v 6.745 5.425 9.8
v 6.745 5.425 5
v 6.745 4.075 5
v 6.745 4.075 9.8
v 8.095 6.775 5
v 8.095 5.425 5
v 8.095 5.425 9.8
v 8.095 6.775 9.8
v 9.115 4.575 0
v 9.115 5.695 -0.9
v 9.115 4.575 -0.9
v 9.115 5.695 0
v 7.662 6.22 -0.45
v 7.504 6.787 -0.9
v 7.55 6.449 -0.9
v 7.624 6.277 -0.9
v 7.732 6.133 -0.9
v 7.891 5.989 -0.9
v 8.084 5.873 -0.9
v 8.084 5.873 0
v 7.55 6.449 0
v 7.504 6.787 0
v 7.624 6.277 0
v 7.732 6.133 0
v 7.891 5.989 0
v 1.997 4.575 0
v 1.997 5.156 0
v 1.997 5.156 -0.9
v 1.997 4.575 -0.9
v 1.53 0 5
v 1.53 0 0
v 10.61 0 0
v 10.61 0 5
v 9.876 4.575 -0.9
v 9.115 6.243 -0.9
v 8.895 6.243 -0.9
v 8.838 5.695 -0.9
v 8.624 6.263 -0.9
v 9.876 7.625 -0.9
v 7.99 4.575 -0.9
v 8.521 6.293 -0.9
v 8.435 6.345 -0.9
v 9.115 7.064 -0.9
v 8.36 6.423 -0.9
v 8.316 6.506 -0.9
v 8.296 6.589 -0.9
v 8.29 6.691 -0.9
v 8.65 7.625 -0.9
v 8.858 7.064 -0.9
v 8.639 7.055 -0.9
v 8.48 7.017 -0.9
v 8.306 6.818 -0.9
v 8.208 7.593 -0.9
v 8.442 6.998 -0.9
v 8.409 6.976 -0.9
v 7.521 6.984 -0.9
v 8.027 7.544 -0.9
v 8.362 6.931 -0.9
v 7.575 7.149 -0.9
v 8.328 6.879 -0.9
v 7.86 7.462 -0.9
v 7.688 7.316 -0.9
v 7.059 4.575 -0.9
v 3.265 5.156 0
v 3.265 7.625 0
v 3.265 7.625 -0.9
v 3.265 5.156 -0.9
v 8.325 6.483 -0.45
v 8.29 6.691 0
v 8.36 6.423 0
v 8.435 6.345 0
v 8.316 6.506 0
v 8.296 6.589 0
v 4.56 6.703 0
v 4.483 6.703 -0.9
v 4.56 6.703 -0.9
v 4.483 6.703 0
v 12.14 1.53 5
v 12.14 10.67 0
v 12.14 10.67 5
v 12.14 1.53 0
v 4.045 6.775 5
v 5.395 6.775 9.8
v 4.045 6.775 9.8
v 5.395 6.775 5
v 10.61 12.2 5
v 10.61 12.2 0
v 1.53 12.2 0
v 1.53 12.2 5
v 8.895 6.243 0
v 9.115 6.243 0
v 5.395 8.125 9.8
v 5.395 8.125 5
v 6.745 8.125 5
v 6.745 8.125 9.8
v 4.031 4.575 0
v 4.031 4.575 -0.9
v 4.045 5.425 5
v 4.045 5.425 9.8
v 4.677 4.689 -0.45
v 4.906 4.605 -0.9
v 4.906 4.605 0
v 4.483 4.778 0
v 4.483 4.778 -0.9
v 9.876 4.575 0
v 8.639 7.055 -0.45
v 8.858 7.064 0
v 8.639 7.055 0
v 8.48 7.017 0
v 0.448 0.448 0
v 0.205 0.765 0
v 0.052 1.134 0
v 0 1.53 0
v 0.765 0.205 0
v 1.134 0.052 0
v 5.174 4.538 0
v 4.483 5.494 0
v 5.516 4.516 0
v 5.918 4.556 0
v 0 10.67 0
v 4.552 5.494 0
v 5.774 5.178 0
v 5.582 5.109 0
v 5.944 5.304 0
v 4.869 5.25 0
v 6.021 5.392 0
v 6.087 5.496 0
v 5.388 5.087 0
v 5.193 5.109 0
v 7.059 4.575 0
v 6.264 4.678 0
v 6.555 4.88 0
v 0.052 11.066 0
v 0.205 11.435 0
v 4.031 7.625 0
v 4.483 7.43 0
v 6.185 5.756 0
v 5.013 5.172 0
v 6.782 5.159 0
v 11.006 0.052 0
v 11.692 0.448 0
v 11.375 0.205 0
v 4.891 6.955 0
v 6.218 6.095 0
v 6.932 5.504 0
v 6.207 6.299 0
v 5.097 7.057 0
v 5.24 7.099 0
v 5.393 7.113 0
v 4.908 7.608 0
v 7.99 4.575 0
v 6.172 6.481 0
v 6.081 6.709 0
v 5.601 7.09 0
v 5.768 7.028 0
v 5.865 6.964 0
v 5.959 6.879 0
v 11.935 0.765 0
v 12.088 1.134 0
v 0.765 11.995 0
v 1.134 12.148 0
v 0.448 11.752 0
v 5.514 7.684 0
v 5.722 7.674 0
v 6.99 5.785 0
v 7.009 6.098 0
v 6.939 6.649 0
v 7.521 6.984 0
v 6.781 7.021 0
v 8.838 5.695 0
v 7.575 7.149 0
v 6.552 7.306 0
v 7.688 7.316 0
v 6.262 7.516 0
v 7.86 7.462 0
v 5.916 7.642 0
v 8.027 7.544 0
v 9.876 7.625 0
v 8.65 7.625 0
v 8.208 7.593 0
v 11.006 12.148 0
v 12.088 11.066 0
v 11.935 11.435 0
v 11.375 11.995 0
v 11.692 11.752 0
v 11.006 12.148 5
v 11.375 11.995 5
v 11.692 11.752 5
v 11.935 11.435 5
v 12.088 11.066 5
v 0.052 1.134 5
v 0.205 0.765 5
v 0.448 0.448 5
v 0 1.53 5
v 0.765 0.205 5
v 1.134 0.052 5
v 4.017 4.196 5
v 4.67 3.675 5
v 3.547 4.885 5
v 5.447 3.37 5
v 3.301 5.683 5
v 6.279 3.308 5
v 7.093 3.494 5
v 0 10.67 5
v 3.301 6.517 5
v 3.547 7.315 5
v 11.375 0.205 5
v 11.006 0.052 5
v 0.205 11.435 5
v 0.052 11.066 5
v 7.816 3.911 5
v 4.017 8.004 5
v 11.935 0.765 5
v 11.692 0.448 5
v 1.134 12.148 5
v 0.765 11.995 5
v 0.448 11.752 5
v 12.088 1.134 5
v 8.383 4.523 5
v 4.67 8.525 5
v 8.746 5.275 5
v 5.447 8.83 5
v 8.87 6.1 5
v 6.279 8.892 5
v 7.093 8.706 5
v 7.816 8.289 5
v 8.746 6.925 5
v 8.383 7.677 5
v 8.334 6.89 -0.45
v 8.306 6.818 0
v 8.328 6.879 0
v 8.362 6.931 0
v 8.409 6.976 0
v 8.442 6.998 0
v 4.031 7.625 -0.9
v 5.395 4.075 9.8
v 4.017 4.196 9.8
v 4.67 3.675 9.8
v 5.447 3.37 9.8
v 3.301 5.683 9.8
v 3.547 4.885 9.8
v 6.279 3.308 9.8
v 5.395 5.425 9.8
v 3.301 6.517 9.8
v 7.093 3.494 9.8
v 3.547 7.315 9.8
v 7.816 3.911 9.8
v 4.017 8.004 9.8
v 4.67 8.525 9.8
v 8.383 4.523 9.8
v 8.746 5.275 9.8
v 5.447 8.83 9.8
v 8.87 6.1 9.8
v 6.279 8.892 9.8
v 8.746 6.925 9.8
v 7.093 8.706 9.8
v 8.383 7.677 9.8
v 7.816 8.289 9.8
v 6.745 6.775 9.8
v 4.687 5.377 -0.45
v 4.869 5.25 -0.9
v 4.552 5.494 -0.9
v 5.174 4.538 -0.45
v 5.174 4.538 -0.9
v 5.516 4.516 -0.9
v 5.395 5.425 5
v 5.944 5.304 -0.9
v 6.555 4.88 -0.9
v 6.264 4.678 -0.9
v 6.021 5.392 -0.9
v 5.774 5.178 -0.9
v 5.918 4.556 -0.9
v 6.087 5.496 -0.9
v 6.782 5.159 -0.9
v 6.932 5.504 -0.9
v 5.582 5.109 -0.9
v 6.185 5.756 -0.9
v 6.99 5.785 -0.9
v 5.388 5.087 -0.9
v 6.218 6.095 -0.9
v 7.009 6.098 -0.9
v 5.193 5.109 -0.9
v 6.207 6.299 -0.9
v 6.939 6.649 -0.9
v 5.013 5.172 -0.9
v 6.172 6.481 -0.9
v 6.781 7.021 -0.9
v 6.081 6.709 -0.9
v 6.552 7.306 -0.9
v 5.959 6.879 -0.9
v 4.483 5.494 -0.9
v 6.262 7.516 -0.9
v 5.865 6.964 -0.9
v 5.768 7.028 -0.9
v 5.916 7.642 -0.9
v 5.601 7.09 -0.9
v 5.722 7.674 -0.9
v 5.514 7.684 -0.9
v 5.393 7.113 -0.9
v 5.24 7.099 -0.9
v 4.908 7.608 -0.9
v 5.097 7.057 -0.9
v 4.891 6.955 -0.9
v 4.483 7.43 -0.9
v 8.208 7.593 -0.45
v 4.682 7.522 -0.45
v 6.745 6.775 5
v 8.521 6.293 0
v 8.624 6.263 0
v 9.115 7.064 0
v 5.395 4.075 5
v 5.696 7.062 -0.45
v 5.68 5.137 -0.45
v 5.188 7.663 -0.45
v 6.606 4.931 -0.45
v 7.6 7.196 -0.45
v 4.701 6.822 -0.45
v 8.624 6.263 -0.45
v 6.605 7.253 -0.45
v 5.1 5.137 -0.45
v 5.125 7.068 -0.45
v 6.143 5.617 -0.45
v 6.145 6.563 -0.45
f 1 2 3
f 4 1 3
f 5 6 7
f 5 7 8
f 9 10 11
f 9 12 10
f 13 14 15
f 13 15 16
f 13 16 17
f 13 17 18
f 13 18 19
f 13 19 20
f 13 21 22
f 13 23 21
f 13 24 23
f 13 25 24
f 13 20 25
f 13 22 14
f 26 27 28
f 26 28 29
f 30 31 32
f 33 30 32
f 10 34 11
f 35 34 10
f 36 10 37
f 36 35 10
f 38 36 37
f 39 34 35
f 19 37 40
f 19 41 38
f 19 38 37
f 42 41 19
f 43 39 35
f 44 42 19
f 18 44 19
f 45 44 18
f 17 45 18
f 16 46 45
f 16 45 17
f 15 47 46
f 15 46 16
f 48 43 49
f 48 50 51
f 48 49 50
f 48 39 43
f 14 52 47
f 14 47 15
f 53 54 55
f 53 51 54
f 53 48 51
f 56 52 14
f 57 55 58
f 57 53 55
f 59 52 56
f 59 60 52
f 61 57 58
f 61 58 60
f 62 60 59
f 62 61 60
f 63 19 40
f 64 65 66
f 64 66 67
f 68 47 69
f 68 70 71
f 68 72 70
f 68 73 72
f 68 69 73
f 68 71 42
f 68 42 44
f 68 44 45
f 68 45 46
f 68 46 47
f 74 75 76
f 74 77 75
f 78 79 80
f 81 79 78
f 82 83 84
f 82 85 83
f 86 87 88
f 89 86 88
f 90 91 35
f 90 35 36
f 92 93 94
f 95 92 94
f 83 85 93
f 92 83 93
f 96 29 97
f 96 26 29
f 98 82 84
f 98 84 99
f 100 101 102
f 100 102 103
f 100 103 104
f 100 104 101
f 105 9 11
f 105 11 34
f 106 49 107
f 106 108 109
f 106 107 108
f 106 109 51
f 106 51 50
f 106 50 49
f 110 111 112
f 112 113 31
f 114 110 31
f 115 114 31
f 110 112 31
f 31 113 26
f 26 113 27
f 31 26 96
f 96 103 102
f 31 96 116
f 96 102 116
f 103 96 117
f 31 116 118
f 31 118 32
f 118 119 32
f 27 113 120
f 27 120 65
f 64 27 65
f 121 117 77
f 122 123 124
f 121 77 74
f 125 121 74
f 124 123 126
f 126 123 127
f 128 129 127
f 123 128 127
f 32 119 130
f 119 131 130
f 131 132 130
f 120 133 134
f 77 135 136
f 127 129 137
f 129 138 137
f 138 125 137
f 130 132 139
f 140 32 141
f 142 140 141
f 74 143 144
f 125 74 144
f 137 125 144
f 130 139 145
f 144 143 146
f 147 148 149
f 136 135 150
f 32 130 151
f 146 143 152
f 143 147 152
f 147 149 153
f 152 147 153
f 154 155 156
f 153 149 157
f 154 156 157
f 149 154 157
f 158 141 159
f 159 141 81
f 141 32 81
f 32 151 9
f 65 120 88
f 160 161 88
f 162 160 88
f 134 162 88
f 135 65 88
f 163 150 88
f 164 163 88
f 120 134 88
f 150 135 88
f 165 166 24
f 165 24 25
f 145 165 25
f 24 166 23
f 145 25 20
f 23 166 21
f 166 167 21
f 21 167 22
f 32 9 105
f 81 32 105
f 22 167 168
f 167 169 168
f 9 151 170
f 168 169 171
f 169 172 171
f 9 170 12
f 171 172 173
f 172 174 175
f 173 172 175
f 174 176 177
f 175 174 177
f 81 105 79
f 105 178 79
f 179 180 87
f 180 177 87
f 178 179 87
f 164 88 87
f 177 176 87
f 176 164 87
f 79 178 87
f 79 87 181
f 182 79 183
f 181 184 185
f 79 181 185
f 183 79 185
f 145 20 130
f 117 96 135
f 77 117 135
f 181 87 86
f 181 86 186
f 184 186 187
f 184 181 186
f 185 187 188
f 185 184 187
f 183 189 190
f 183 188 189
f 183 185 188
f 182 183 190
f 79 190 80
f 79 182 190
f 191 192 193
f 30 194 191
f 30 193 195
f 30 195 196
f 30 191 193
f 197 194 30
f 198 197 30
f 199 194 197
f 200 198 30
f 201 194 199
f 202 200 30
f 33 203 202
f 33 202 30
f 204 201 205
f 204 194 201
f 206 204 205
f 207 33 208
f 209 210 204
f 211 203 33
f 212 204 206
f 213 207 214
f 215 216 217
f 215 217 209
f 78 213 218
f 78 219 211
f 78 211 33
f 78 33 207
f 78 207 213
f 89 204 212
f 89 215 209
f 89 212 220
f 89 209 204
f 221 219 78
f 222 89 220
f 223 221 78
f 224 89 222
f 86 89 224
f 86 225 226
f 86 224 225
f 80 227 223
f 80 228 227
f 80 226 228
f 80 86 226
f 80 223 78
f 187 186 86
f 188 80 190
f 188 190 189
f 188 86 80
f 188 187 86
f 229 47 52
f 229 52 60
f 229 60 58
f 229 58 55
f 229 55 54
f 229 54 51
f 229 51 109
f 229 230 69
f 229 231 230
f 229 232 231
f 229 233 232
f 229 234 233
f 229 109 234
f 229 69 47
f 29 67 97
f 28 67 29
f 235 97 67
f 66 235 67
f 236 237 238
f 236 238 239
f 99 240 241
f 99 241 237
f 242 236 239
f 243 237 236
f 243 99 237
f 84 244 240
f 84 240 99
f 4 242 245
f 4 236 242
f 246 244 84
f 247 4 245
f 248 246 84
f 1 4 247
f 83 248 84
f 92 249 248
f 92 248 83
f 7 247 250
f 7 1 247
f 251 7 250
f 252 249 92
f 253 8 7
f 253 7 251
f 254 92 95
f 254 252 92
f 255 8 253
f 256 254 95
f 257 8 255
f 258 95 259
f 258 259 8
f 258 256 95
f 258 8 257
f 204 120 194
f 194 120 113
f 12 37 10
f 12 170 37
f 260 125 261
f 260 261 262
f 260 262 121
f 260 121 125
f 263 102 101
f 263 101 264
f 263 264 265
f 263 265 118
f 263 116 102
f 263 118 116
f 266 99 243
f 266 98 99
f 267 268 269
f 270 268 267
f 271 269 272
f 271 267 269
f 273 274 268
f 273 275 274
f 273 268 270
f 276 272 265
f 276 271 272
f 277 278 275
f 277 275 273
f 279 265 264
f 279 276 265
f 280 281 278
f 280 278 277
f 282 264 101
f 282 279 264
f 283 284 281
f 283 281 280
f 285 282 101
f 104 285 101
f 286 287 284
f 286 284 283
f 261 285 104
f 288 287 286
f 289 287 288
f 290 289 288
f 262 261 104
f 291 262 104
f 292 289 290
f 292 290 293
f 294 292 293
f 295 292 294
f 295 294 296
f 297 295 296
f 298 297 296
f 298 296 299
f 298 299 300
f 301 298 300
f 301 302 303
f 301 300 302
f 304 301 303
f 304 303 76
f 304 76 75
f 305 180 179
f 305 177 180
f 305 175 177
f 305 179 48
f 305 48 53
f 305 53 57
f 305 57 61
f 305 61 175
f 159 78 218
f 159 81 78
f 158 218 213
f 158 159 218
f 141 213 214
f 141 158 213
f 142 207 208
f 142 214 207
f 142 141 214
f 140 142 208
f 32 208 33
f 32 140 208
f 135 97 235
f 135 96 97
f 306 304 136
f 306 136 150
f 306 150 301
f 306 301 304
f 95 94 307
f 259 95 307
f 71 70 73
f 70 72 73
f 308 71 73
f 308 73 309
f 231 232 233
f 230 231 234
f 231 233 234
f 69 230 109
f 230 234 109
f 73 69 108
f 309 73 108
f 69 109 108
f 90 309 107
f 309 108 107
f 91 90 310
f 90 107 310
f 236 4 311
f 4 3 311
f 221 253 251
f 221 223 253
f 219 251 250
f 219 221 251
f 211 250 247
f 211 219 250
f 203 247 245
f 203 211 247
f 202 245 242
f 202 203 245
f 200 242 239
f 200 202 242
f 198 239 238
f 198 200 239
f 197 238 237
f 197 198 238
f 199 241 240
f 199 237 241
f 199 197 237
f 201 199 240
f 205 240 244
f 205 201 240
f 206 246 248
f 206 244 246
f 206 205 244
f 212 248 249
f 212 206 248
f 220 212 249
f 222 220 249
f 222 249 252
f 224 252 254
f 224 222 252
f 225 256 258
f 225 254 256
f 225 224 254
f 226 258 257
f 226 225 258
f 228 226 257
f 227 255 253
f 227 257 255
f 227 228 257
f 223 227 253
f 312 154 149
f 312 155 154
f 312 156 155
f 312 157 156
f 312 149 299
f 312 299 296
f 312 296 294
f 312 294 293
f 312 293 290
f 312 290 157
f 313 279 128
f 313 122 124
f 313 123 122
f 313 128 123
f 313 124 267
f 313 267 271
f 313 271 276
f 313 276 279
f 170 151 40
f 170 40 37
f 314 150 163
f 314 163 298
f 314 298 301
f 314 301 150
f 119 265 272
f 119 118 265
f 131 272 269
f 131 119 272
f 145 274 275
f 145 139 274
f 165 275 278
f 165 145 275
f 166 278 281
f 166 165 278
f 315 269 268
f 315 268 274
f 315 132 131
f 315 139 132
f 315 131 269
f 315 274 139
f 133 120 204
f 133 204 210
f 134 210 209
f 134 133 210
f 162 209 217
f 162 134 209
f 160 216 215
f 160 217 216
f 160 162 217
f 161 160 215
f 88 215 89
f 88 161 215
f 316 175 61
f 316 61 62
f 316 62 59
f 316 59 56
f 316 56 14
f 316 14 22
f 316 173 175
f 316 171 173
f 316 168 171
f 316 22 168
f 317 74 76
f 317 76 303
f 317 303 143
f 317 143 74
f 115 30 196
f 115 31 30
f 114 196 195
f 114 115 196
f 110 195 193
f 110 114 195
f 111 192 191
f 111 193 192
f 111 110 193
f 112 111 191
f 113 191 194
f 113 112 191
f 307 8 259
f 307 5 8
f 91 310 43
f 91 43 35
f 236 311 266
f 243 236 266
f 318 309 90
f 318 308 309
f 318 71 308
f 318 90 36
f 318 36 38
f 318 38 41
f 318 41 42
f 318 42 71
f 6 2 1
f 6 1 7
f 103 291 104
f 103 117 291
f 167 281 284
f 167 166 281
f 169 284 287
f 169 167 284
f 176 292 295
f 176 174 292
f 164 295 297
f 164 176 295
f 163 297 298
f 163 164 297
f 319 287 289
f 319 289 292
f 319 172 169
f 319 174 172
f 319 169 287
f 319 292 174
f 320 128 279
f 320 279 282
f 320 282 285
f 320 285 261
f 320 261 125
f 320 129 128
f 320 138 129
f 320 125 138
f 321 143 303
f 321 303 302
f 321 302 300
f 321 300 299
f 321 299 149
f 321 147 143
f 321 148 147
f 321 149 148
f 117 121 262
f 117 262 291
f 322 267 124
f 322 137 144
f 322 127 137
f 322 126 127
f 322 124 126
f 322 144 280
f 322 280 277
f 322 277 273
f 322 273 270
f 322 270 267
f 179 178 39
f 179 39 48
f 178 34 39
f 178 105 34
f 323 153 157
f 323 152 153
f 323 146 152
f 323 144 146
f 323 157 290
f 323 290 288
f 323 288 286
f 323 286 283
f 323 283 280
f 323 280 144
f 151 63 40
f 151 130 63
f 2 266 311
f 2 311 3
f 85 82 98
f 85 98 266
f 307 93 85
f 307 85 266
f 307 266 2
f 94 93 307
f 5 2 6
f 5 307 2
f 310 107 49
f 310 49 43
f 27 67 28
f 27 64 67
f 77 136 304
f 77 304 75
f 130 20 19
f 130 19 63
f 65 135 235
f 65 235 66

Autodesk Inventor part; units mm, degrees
ref_plane "YZ Plane" through (0, 0, 0) normal (1, 0, 0) x (0, 1, 0)
ref_plane "XZ Plane" through (0, 0, 0) normal (0, 1, 0) x (-1, 0, 0)
sketch "Sketch1" plane through (0, 0, 0) normal (0, 0, 1) x (1, 0, 0)
  line L0 (14.6962, 12.74) -> (14.6962, 0) construction
  line L1 (10.61, 12.2) -> (1.53, 12.2)
  arc A0 (1.53, 12.2) -> (0, 10.67) centre (1.53, 10.67) ccw
  line L2 (0, 10.67) -> (0, 1.53)
  arc A1 (0, 1.53) -> (1.53, 0) centre (1.53, 1.53) ccw
  line L3 (1.53, 0) -> (10.61, 0)
  arc A2 (10.61, 0) -> (12.14, 1.53) centre (10.61, 1.53) ccw
  arc A3 (12.14, 10.67) -> (10.61, 12.2) centre (10.61, 10.67) ccw
  line L4 (12.14, 10.67) -> (12.14, 1.53)
  point P0 (0, 0)
  point P1 (0, 0)
  dimension "d10" = 12.74
ref_plane "Work Plane1" through (0, 0, 5) normal (0, 0, 1) x (1, 0, 0)
sketch "Sketch2" plane through (0, 0, 5) normal (0, 0, 1) x (1, 0, 0)
  line L0 (10.88, 12.74) -> (1.8, 12.74) projected
  line L1 (10.88, 12.74) -> (1.8, 12.74) projected
  arc A0 (1.8, 12.74) -> (0, 10.94) centre (1.8, 10.94) ccw projected
  line L2 (0, 10.94) -> (0, 1.8) projected
  arc A1 (0, 1.8) -> (1.8, 0) centre (1.8, 1.8) ccw projected
  line L3 (1.8, 0) -> (10.88, 0) projected
  arc A2 (10.88, 0) -> (12.68, 1.8) centre (10.88, 1.8) ccw projected
  line L4 (12.68, 1.8) -> (12.68, 10.94) projected
  arc A3 (12.68, 10.94) -> (10.88, 12.74) centre (10.88, 10.94) ccw projected
  circle A4 centre (6.34, 6.37) radius 2.8
  line L5 (5.665, 8.395) -> (7.015, 8.395)
  line L6 (7.015, 4.345) -> (5.665, 4.345)
  line L7 (5.665, 4.345) -> (7.015, 8.395) construction
  line L8 (5.665, 8.395) -> (7.015, 4.345) construction
  line L9 (8.365, 5.695) -> (8.365, 7.045)
  line L10 (4.315, 7.045) -> (4.315, 5.695)
  line L11 (4.315, 5.695) -> (8.365, 7.045) construction
  line L12 (8.365, 5.695) -> (4.315, 7.045) construction
  line L13 (4.315, 5.695) -> (5.665, 5.695)
  line L14 (7.015, 5.695) -> (8.365, 5.695)
  line L15 (5.665, 4.345) -> (5.665, 5.695)
  line L16 (5.665, 7.045) -> (5.665, 8.395)
  line L17 (8.365, 7.045) -> (7.015, 7.045)
  line L18 (5.665, 7.045) -> (4.315, 7.045)
  line L19 (7.015, 8.395) -> (7.015, 7.045)
  line L20 (7.015, 5.695) -> (7.015, 4.345)
  point P0 (0, 0)
  dimension "d3" = 5.6
  dimension "d4" = 4.05
  dimension "d5" = 1.35
  dimension "d6" = 4.05
  dimension "d7" = 1.35
extrude "Extrusion3" add sketch "Sketch1" along normal blind 5
sketch "Sketch3" plane through (0, 0, 5) normal (0, 0, 1) x (1, 0, 0)
  line L0 (10.61, 12.47) -> (1.53, 12.47)
  line L1 (10.61, 12.47) -> (1.53, 12.47)
  arc A0 (1.53, 12.47) -> (-0.27, 10.67) centre (1.53, 10.67) ccw
  line L2 (-0.27, 10.67) -> (-0.27, 1.53)
  arc A1 (-0.27, 1.53) -> (1.53, -0.27) centre (1.53, 1.53) ccw
  line L3 (1.53, -0.27) -> (10.61, -0.27)
  arc A2 (10.61, -0.27) -> (12.41, 1.53) centre (10.61, 1.53) ccw
  line L4 (12.41, 1.53) -> (12.41, 10.67)
  arc A3 (12.41, 10.67) -> (10.61, 12.47) centre (10.61, 10.67) ccw
  circle A4 centre (6.07, 6.1) radius 2.8
  line L5 (5.395, 8.125) -> (6.745, 8.125)
  line L6 (6.745, 4.075) -> (5.395, 4.075)
  line L7 (5.395, 4.075) -> (6.745, 8.125) construction
  line L8 (5.395, 8.125) -> (6.745, 4.075) construction
  line L9 (8.095, 5.425) -> (8.095, 6.775)
  line L10 (4.045, 6.775) -> (4.045, 5.425)
  line L11 (4.045, 5.425) -> (8.095, 6.775) construction
  line L12 (8.095, 5.425) -> (4.045, 6.775) construction
  line L13 (4.045, 5.425) -> (5.395, 5.425)
  line L14 (6.745, 5.425) -> (8.095, 5.425)
  line L15 (5.395, 4.075) -> (5.395, 5.425)
  line L16 (5.395, 6.775) -> (5.395, 8.125)
  line L17 (8.095, 6.775) -> (6.745, 6.775)
  line L18 (5.395, 6.775) -> (4.045, 6.775)
  line L19 (6.745, 8.125) -> (6.745, 6.775)
  line L20 (6.745, 5.425) -> (6.745, 4.075)
  line L21 (10.61, 12.2) -> (1.53, 12.2) projected
  line L22 (0, 10.67) -> (0, 1.53) projected
  point P0 (0, 0)
  point P1 (-0.27, -0.27)
  point P2 (6.07, 12.2)
  point P3 (0, 6.1)
  point P4 (6.07, 6.1)
  dimension "d14" = 5.6
  dimension "d15" = 4.05
  dimension "d16" = 1.35
  dimension "d17" = 4.05
  dimension "d18" = 1.35
extrude "Extrusion4" add sketch "Sketch3" along normal blind 4.8 contours A4
sketch "Sketch4" plane through (0, 0, 0) normal (0, 0, -1) x (-1, 0, 0)
  line L0 (-13.9436, 0) -> (-13.9436, 2.266)
  line L1 (-15.5559, 0) -> (-15.5559, 6.84)
  line L2 (-1.53, 0) -> (-10.61, 0) projected
  line L3 (-10.1927, 7.6843) -> (-1.9473, 7.6843) construction
  line L4 (-1.9473, 7.6843) -> (-1.9473, 4.5157) construction
  line L5 (-1.9473, 4.5157) -> (-10.1927, 4.5157) construction
  line L6 (-10.1927, 4.5157) -> (-10.1927, 7.6843) construction
  line L7 (-7.0587, 4.575) -> (-7.9905, 4.575)
  line L8 (-7.9905, 4.575) -> (-8.8382, 5.6947)
  line L9 (-8.8382, 5.6947) -> (-9.1151, 5.6947)
  line L10 (-9.1151, 5.6947) -> (-9.1151, 4.575)
  line L11 (-9.1151, 4.575) -> (-9.8763, 4.575)
  line L12 (-9.8763, 4.575) -> (-9.8763, 7.625)
  line L13 (-9.8763, 7.625) -> (-8.6504, 7.625)
  spline S0 degree 2 poles (-8.6504, 7.625) (-8.3958, 7.625) (-8.0201, 7.5607) (-7.8595, 7.4619) knots 0 0 0 1 2 2 2
  spline S1 degree 2 poles (-7.8595, 7.4619) (-7.6963, 7.3581) (-7.5035, 7.0343) (-7.5035, 6.7871) knots 0 0 0 1 2 2 2
  spline S2 degree 2 poles (-7.5035, 6.7871) (-7.5035, 6.4386) (-7.8199, 6.0011) (-8.0844, 5.8726) knots 0 0 0 1 2 2 2
  line L14 (-8.0844, 5.8726) -> (-7.0587, 4.575)
  spline S3 degree 2 poles (-8.2895, 6.6907) (-8.2895, 6.8069) (-8.3785, 6.9725) (-8.4798, 7.017) knots 0 0 0 1 2 2 2
  spline S4 degree 2 poles (-8.4798, 7.017) (-8.5515, 7.0466) (-8.727, 7.0639) (-8.858, 7.0639) knots 0 0 0 1 2 2 2
  line L15 (-8.858, 7.0639) -> (-9.1151, 7.0639)
  line L16 (-9.1151, 7.0639) -> (-9.1151, 6.2434)
  line L17 (-9.1151, 6.2434) -> (-8.8951, 6.2434)
  spline S5 degree 2 poles (-8.8951, 6.2434) (-8.7369, 6.2434) (-8.512, 6.2829) (-8.4354, 6.3447) knots 0 0 0 1 2 2 2
  spline S6 degree 2 poles (-8.4354, 6.3447) (-8.3612, 6.404) (-8.2895, 6.5622) (-8.2895, 6.6907) knots 0 0 0 1 2 2 2
  spline S7 degree 2 poles (-5.5164, 4.5157) (-6.2035, 4.5157) (-7.0092, 5.3462) (-7.0092, 6.0975) knots 0 0 0 1 2 2 2
  spline S8 degree 2 poles (-7.0092, 6.0975) (-7.0092, 6.8217) (-6.201, 7.6843) (-5.5139, 7.6843) knots 0 0 0 1 2 2 2
  spline S9 degree 2 poles (-5.5139, 7.6843) (-5.3335, 7.6843) (-5.0418, 7.6423) (-4.9083, 7.6077) knots 0 0 0 1 2 2 2
  spline S10 degree 2 poles (-4.9083, 7.6077) (-4.8045, 7.5756) (-4.5598, 7.4693) (-4.4832, 7.4297) knots 0 0 0 1 2 2 2
  line L18 (-4.4832, 7.4297) -> (-4.4832, 6.7031)
  line L19 (-4.4832, 6.7031) -> (-4.5598, 6.7031)
  spline S11 degree 2 poles (-4.5598, 6.7031) (-4.6167, 6.7525) (-4.7847, 6.8909) (-4.891, 6.9552) knots 0 0 0 1 2 2 2
  spline S12 degree 2 poles (-4.891, 6.9552) (-4.9973, 7.0219) (-5.2519, 7.1134) (-5.3928, 7.1134) knots 0 0 0 1 2 2 2
  spline S13 degree 2 poles (-5.3928, 7.1134) (-5.5584, 7.1134) (-5.8327, 7.0096) (-5.9588, 6.8786) knots 0 0 0 1 2 2 2
  spline S14 degree 2 poles (-5.9588, 6.8786) (-6.0725, 6.7624) (-6.2183, 6.3645) (-6.2183, 6.0951) knots 0 0 0 1 2 2 2
  spline S15 degree 2 poles (-6.2183, 6.0951) (-6.2183, 5.8108) (-6.0675, 5.4228) (-5.9439, 5.3041) knots 0 0 0 1 2 2 2
  spline S16 degree 2 poles (-5.9439, 5.3041) (-5.8253, 5.188) (-5.5337, 5.0866) (-5.3878, 5.0866) knots 0 0 0 1 2 2 2
  spline S17 degree 2 poles (-5.3878, 5.0866) (-5.2371, 5.0866) (-4.9627, 5.188) (-4.8688, 5.2498) knots 0 0 0 1 2 2 2
  spline S18 degree 2 poles (-4.8688, 5.2498) (-4.765, 5.3115) (-4.6093, 5.4425) (-4.5524, 5.4944) knots 0 0 0 1 2 2 2
  line L20 (-4.5524, 5.4944) -> (-4.4832, 5.4944)
  line L21 (-4.4832, 5.4944) -> (-4.4832, 4.7777)
  spline S19 degree 2 poles (-4.4832, 4.7777) (-4.5672, 4.7381) (-4.7872, 4.6393) (-4.9059, 4.6047) knots 0 0 0 1 2 2 2
  spline S20 degree 2 poles (-4.9059, 4.6047) (-5.0492, 4.5602) (-5.2988, 4.5157) (-5.5164, 4.5157) knots 0 0 0 1 2 2 2
  line L22 (-1.9967, 4.575) -> (-4.0309, 4.575)
  line L23 (-4.0309, 4.575) -> (-4.0309, 7.625)
  line L24 (-4.0309, 7.625) -> (-3.2647, 7.625)
  line L25 (-3.2647, 7.625) -> (-3.2647, 5.1558)
  line L26 (-3.2647, 5.1558) -> (-1.9967, 5.1558)
  line L27 (-1.9967, 5.1558) -> (-1.9967, 4.575)
  point P0 (0, 0)
  point P1 (-6.07, 0)
  point P2 (-6.07, 2.266)
  point P3 (-6.07, 6.1)
  point P4 (-6.07, 6.84)
  point P5 (-6.07, 4.5157)
  point P6 (-1.9473, 6.1)
  point P7 (-6.07, 6.1)
  dimension "d21" = 2.266
  dimension "d22" = 6.84
extrude "Extrusion5" add sketch "Sketch4" along normal blind 0.9
sketch "Sketch5" plane through (6.07, 6.1, 9.8) normal (0, 0, 1) x (1, 0, 0)
  circle A0 centre (0, 0) radius 2.8 projected
  line L0 (-0.675, 0.675) -> (-0.675, 2.025) projected
  line L1 (-0.675, 2.025) -> (0.675, 2.025) projected
  line L2 (0.675, 2.025) -> (0.675, 0.675) projected
  line L3 (0.675, 0.675) -> (2.025, 0.675) projected
  line L4 (2.025, 0.675) -> (2.025, -0.675) projected
  line L5 (2.025, -0.675) -> (0.675, -0.675) projected
  line L6 (0.675, -0.675) -> (0.675, -2.025) projected
  line L7 (0.675, -2.025) -> (-0.675, -2.025) projected
  line L8 (-0.675, -2.025) -> (-0.675, -0.675) projected
  line L9 (-0.675, -0.675) -> (-2.025, -0.675) projected
  line L10 (-2.025, -0.675) -> (-2.025, 0.675) projected
  line L11 (-2.025, 0.675) -> (-0.675, 0.675) projected
  point P0 (-6.07, -6.1)
properties part number "IPC RCL key"
